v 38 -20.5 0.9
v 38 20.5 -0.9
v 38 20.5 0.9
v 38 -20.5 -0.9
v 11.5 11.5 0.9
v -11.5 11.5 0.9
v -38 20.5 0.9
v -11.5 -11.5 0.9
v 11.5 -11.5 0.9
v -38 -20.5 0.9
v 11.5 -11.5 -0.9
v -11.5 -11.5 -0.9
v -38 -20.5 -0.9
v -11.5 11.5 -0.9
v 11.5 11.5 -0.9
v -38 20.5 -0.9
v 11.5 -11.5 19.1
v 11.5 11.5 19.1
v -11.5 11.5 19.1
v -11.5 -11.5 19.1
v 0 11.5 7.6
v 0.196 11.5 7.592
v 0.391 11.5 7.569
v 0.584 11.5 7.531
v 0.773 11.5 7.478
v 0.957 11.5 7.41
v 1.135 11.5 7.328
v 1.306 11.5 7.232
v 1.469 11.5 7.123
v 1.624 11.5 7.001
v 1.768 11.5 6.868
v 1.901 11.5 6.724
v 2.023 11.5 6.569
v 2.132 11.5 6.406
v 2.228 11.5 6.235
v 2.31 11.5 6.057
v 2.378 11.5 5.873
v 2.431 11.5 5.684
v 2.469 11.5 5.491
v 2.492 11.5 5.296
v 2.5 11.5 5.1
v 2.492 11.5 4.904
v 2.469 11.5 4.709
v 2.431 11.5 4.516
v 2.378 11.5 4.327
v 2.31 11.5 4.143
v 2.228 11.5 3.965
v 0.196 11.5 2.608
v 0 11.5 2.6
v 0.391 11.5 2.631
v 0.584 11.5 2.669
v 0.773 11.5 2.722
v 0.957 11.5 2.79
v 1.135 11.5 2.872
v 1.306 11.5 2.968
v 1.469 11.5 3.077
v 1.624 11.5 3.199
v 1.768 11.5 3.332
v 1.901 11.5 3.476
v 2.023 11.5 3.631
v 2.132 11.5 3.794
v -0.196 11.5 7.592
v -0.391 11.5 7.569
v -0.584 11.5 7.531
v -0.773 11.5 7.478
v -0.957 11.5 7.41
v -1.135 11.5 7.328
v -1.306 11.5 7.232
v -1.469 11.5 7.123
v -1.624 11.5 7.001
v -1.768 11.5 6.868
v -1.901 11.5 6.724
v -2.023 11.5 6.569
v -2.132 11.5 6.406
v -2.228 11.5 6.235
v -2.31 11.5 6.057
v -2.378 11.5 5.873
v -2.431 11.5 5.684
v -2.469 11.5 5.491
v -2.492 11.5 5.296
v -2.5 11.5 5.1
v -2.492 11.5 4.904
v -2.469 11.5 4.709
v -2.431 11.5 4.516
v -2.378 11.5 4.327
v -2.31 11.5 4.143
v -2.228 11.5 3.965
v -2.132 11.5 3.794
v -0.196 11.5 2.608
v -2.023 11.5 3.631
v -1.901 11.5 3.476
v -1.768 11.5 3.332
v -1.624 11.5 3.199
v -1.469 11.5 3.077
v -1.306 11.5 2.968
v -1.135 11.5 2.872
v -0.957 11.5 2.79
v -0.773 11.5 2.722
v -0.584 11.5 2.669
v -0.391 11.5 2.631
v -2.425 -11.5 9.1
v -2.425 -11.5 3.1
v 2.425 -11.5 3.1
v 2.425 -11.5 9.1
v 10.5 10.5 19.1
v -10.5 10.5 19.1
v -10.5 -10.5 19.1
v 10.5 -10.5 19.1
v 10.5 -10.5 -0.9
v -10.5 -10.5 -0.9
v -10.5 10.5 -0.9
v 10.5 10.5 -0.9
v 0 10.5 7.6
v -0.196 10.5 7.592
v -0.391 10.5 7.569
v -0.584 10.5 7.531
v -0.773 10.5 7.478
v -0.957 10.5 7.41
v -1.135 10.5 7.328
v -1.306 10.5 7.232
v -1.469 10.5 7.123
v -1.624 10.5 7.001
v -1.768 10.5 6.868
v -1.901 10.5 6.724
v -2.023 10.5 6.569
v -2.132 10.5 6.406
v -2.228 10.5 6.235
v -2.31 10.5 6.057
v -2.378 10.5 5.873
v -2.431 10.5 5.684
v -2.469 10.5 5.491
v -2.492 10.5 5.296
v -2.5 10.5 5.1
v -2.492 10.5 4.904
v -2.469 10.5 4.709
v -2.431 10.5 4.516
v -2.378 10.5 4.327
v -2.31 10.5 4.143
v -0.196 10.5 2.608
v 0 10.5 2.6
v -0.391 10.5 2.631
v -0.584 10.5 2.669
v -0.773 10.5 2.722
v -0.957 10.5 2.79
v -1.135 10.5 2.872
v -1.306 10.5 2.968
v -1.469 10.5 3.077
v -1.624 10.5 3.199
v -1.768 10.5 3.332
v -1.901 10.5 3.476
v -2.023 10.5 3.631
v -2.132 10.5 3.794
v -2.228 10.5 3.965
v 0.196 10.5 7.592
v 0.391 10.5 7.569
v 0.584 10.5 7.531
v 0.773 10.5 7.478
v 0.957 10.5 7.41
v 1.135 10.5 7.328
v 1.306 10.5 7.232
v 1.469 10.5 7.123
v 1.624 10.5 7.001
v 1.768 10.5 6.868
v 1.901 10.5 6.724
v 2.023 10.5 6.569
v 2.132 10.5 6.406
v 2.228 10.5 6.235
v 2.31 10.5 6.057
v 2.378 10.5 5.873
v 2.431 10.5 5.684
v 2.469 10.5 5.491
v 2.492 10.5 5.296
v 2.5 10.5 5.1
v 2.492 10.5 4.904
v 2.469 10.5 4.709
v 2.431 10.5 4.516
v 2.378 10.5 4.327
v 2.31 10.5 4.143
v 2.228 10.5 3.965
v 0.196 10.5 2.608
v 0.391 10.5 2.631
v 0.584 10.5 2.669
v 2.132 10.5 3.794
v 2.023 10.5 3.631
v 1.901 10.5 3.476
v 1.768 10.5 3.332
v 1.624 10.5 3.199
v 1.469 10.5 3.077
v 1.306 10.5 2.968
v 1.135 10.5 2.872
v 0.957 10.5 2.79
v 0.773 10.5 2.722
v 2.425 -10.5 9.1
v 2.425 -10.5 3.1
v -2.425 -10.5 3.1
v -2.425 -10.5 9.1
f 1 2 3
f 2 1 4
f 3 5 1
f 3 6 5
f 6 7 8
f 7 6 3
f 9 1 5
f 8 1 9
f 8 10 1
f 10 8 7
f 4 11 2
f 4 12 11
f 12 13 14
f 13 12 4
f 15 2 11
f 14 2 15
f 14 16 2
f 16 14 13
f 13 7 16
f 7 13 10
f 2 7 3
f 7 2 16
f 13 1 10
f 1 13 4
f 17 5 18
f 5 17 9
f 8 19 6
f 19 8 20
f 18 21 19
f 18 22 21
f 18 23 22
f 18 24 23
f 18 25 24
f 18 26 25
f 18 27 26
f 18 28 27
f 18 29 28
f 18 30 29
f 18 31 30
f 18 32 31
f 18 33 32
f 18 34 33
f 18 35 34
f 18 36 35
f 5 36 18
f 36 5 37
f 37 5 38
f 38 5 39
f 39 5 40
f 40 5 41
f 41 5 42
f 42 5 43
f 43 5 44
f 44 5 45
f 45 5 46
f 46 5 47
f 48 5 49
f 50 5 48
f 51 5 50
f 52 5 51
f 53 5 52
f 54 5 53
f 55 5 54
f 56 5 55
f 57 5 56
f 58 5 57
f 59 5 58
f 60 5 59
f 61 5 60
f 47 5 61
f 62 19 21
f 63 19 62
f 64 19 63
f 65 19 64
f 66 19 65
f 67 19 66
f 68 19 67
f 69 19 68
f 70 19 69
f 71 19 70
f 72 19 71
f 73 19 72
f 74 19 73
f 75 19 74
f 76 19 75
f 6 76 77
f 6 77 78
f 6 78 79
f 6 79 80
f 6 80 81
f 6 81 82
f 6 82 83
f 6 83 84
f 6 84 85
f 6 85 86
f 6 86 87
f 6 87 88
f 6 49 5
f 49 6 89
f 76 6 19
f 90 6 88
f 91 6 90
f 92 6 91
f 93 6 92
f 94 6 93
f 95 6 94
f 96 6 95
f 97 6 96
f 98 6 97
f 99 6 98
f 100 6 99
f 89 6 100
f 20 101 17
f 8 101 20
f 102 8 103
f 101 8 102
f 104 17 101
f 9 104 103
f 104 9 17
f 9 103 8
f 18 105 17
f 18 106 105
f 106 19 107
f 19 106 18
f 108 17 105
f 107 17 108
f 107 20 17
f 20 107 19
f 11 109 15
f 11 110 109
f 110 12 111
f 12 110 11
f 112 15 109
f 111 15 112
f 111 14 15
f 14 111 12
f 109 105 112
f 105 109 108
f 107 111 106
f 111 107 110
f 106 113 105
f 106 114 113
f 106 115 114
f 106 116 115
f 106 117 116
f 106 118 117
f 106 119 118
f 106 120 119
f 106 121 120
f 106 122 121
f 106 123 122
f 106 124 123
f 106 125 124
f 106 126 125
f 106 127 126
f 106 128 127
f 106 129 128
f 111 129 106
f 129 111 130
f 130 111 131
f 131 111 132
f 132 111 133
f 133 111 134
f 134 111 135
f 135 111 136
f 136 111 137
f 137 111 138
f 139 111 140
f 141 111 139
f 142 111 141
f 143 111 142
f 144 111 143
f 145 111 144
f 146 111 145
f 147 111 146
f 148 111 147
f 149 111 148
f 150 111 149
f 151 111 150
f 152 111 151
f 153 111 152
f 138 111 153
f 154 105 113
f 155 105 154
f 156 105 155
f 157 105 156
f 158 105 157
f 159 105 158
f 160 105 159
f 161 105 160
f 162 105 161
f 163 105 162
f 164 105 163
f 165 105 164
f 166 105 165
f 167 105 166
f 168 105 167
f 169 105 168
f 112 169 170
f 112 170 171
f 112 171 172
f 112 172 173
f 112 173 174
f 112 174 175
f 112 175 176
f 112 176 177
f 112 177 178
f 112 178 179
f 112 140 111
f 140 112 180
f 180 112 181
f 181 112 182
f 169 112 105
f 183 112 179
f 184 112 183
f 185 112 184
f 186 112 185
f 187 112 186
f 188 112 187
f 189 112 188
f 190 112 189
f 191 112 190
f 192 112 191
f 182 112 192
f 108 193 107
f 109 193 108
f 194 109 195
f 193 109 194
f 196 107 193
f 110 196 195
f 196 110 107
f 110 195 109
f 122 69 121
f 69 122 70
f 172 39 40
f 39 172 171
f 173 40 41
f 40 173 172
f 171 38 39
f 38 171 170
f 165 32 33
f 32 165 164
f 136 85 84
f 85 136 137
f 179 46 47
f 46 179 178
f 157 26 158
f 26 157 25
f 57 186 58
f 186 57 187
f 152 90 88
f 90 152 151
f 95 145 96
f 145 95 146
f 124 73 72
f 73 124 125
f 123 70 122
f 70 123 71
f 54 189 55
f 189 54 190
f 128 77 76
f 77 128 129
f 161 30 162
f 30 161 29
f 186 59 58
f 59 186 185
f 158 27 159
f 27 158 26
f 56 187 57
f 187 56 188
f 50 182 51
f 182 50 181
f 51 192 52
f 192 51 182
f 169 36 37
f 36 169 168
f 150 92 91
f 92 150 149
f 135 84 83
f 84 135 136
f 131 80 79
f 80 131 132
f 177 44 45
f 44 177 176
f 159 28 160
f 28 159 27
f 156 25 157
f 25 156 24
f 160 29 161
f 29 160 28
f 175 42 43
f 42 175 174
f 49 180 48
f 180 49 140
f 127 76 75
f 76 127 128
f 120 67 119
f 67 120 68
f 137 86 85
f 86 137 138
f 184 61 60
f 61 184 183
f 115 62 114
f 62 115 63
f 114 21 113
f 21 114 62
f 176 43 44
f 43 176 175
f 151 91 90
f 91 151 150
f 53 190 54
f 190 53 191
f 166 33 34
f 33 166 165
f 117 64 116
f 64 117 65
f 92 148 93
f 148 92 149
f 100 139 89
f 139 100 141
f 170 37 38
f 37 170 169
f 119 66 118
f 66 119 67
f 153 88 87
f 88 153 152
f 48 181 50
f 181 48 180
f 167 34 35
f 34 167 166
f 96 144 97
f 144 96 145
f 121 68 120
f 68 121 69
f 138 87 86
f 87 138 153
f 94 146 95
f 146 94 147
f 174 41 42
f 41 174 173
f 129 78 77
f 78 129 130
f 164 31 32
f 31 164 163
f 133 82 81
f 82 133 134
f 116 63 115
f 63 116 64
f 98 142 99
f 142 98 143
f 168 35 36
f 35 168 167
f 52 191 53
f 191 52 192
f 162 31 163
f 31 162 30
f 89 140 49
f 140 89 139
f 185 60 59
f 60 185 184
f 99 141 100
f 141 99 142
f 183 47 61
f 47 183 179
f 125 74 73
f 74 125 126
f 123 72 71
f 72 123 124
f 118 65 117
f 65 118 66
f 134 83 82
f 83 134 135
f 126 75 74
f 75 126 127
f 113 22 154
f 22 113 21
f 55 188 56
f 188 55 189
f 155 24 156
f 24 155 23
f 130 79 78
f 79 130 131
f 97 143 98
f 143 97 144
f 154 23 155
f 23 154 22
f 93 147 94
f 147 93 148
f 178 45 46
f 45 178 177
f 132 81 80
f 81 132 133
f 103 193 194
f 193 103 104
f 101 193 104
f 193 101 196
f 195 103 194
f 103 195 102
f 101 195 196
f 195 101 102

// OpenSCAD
platex = 76;
platey = 41;
platez = 1.8;


outterx = 23;
outtery = 23;
outterz = 20;

putInMiddle = 2;

innerx = outterx-putInMiddle;
innery = outtery-putInMiddle;
innerz = outterz+putInMiddle;

$fn=80;

module empty_cube(){

difference(){
difference(){
cube([outterx,outtery,outterz],center = true);
cube([innerx,innery,innerz],center = true);
}

translate([0,15,-4]){
rotate([90,0,0]){

cylinder(10,2.5,2.5);}}

translate([0,-10,-3]){
cube([4.85,6,6],center = true);}}
}

module hole(){
cube([outterx,outterx,outterz+1],center = true);
}

union(){
difference(){
cube([platex,platey,platez],center = true);
hole();}

translate([0,0,(outterz/2)-0.9]){empty_cube();}
}
